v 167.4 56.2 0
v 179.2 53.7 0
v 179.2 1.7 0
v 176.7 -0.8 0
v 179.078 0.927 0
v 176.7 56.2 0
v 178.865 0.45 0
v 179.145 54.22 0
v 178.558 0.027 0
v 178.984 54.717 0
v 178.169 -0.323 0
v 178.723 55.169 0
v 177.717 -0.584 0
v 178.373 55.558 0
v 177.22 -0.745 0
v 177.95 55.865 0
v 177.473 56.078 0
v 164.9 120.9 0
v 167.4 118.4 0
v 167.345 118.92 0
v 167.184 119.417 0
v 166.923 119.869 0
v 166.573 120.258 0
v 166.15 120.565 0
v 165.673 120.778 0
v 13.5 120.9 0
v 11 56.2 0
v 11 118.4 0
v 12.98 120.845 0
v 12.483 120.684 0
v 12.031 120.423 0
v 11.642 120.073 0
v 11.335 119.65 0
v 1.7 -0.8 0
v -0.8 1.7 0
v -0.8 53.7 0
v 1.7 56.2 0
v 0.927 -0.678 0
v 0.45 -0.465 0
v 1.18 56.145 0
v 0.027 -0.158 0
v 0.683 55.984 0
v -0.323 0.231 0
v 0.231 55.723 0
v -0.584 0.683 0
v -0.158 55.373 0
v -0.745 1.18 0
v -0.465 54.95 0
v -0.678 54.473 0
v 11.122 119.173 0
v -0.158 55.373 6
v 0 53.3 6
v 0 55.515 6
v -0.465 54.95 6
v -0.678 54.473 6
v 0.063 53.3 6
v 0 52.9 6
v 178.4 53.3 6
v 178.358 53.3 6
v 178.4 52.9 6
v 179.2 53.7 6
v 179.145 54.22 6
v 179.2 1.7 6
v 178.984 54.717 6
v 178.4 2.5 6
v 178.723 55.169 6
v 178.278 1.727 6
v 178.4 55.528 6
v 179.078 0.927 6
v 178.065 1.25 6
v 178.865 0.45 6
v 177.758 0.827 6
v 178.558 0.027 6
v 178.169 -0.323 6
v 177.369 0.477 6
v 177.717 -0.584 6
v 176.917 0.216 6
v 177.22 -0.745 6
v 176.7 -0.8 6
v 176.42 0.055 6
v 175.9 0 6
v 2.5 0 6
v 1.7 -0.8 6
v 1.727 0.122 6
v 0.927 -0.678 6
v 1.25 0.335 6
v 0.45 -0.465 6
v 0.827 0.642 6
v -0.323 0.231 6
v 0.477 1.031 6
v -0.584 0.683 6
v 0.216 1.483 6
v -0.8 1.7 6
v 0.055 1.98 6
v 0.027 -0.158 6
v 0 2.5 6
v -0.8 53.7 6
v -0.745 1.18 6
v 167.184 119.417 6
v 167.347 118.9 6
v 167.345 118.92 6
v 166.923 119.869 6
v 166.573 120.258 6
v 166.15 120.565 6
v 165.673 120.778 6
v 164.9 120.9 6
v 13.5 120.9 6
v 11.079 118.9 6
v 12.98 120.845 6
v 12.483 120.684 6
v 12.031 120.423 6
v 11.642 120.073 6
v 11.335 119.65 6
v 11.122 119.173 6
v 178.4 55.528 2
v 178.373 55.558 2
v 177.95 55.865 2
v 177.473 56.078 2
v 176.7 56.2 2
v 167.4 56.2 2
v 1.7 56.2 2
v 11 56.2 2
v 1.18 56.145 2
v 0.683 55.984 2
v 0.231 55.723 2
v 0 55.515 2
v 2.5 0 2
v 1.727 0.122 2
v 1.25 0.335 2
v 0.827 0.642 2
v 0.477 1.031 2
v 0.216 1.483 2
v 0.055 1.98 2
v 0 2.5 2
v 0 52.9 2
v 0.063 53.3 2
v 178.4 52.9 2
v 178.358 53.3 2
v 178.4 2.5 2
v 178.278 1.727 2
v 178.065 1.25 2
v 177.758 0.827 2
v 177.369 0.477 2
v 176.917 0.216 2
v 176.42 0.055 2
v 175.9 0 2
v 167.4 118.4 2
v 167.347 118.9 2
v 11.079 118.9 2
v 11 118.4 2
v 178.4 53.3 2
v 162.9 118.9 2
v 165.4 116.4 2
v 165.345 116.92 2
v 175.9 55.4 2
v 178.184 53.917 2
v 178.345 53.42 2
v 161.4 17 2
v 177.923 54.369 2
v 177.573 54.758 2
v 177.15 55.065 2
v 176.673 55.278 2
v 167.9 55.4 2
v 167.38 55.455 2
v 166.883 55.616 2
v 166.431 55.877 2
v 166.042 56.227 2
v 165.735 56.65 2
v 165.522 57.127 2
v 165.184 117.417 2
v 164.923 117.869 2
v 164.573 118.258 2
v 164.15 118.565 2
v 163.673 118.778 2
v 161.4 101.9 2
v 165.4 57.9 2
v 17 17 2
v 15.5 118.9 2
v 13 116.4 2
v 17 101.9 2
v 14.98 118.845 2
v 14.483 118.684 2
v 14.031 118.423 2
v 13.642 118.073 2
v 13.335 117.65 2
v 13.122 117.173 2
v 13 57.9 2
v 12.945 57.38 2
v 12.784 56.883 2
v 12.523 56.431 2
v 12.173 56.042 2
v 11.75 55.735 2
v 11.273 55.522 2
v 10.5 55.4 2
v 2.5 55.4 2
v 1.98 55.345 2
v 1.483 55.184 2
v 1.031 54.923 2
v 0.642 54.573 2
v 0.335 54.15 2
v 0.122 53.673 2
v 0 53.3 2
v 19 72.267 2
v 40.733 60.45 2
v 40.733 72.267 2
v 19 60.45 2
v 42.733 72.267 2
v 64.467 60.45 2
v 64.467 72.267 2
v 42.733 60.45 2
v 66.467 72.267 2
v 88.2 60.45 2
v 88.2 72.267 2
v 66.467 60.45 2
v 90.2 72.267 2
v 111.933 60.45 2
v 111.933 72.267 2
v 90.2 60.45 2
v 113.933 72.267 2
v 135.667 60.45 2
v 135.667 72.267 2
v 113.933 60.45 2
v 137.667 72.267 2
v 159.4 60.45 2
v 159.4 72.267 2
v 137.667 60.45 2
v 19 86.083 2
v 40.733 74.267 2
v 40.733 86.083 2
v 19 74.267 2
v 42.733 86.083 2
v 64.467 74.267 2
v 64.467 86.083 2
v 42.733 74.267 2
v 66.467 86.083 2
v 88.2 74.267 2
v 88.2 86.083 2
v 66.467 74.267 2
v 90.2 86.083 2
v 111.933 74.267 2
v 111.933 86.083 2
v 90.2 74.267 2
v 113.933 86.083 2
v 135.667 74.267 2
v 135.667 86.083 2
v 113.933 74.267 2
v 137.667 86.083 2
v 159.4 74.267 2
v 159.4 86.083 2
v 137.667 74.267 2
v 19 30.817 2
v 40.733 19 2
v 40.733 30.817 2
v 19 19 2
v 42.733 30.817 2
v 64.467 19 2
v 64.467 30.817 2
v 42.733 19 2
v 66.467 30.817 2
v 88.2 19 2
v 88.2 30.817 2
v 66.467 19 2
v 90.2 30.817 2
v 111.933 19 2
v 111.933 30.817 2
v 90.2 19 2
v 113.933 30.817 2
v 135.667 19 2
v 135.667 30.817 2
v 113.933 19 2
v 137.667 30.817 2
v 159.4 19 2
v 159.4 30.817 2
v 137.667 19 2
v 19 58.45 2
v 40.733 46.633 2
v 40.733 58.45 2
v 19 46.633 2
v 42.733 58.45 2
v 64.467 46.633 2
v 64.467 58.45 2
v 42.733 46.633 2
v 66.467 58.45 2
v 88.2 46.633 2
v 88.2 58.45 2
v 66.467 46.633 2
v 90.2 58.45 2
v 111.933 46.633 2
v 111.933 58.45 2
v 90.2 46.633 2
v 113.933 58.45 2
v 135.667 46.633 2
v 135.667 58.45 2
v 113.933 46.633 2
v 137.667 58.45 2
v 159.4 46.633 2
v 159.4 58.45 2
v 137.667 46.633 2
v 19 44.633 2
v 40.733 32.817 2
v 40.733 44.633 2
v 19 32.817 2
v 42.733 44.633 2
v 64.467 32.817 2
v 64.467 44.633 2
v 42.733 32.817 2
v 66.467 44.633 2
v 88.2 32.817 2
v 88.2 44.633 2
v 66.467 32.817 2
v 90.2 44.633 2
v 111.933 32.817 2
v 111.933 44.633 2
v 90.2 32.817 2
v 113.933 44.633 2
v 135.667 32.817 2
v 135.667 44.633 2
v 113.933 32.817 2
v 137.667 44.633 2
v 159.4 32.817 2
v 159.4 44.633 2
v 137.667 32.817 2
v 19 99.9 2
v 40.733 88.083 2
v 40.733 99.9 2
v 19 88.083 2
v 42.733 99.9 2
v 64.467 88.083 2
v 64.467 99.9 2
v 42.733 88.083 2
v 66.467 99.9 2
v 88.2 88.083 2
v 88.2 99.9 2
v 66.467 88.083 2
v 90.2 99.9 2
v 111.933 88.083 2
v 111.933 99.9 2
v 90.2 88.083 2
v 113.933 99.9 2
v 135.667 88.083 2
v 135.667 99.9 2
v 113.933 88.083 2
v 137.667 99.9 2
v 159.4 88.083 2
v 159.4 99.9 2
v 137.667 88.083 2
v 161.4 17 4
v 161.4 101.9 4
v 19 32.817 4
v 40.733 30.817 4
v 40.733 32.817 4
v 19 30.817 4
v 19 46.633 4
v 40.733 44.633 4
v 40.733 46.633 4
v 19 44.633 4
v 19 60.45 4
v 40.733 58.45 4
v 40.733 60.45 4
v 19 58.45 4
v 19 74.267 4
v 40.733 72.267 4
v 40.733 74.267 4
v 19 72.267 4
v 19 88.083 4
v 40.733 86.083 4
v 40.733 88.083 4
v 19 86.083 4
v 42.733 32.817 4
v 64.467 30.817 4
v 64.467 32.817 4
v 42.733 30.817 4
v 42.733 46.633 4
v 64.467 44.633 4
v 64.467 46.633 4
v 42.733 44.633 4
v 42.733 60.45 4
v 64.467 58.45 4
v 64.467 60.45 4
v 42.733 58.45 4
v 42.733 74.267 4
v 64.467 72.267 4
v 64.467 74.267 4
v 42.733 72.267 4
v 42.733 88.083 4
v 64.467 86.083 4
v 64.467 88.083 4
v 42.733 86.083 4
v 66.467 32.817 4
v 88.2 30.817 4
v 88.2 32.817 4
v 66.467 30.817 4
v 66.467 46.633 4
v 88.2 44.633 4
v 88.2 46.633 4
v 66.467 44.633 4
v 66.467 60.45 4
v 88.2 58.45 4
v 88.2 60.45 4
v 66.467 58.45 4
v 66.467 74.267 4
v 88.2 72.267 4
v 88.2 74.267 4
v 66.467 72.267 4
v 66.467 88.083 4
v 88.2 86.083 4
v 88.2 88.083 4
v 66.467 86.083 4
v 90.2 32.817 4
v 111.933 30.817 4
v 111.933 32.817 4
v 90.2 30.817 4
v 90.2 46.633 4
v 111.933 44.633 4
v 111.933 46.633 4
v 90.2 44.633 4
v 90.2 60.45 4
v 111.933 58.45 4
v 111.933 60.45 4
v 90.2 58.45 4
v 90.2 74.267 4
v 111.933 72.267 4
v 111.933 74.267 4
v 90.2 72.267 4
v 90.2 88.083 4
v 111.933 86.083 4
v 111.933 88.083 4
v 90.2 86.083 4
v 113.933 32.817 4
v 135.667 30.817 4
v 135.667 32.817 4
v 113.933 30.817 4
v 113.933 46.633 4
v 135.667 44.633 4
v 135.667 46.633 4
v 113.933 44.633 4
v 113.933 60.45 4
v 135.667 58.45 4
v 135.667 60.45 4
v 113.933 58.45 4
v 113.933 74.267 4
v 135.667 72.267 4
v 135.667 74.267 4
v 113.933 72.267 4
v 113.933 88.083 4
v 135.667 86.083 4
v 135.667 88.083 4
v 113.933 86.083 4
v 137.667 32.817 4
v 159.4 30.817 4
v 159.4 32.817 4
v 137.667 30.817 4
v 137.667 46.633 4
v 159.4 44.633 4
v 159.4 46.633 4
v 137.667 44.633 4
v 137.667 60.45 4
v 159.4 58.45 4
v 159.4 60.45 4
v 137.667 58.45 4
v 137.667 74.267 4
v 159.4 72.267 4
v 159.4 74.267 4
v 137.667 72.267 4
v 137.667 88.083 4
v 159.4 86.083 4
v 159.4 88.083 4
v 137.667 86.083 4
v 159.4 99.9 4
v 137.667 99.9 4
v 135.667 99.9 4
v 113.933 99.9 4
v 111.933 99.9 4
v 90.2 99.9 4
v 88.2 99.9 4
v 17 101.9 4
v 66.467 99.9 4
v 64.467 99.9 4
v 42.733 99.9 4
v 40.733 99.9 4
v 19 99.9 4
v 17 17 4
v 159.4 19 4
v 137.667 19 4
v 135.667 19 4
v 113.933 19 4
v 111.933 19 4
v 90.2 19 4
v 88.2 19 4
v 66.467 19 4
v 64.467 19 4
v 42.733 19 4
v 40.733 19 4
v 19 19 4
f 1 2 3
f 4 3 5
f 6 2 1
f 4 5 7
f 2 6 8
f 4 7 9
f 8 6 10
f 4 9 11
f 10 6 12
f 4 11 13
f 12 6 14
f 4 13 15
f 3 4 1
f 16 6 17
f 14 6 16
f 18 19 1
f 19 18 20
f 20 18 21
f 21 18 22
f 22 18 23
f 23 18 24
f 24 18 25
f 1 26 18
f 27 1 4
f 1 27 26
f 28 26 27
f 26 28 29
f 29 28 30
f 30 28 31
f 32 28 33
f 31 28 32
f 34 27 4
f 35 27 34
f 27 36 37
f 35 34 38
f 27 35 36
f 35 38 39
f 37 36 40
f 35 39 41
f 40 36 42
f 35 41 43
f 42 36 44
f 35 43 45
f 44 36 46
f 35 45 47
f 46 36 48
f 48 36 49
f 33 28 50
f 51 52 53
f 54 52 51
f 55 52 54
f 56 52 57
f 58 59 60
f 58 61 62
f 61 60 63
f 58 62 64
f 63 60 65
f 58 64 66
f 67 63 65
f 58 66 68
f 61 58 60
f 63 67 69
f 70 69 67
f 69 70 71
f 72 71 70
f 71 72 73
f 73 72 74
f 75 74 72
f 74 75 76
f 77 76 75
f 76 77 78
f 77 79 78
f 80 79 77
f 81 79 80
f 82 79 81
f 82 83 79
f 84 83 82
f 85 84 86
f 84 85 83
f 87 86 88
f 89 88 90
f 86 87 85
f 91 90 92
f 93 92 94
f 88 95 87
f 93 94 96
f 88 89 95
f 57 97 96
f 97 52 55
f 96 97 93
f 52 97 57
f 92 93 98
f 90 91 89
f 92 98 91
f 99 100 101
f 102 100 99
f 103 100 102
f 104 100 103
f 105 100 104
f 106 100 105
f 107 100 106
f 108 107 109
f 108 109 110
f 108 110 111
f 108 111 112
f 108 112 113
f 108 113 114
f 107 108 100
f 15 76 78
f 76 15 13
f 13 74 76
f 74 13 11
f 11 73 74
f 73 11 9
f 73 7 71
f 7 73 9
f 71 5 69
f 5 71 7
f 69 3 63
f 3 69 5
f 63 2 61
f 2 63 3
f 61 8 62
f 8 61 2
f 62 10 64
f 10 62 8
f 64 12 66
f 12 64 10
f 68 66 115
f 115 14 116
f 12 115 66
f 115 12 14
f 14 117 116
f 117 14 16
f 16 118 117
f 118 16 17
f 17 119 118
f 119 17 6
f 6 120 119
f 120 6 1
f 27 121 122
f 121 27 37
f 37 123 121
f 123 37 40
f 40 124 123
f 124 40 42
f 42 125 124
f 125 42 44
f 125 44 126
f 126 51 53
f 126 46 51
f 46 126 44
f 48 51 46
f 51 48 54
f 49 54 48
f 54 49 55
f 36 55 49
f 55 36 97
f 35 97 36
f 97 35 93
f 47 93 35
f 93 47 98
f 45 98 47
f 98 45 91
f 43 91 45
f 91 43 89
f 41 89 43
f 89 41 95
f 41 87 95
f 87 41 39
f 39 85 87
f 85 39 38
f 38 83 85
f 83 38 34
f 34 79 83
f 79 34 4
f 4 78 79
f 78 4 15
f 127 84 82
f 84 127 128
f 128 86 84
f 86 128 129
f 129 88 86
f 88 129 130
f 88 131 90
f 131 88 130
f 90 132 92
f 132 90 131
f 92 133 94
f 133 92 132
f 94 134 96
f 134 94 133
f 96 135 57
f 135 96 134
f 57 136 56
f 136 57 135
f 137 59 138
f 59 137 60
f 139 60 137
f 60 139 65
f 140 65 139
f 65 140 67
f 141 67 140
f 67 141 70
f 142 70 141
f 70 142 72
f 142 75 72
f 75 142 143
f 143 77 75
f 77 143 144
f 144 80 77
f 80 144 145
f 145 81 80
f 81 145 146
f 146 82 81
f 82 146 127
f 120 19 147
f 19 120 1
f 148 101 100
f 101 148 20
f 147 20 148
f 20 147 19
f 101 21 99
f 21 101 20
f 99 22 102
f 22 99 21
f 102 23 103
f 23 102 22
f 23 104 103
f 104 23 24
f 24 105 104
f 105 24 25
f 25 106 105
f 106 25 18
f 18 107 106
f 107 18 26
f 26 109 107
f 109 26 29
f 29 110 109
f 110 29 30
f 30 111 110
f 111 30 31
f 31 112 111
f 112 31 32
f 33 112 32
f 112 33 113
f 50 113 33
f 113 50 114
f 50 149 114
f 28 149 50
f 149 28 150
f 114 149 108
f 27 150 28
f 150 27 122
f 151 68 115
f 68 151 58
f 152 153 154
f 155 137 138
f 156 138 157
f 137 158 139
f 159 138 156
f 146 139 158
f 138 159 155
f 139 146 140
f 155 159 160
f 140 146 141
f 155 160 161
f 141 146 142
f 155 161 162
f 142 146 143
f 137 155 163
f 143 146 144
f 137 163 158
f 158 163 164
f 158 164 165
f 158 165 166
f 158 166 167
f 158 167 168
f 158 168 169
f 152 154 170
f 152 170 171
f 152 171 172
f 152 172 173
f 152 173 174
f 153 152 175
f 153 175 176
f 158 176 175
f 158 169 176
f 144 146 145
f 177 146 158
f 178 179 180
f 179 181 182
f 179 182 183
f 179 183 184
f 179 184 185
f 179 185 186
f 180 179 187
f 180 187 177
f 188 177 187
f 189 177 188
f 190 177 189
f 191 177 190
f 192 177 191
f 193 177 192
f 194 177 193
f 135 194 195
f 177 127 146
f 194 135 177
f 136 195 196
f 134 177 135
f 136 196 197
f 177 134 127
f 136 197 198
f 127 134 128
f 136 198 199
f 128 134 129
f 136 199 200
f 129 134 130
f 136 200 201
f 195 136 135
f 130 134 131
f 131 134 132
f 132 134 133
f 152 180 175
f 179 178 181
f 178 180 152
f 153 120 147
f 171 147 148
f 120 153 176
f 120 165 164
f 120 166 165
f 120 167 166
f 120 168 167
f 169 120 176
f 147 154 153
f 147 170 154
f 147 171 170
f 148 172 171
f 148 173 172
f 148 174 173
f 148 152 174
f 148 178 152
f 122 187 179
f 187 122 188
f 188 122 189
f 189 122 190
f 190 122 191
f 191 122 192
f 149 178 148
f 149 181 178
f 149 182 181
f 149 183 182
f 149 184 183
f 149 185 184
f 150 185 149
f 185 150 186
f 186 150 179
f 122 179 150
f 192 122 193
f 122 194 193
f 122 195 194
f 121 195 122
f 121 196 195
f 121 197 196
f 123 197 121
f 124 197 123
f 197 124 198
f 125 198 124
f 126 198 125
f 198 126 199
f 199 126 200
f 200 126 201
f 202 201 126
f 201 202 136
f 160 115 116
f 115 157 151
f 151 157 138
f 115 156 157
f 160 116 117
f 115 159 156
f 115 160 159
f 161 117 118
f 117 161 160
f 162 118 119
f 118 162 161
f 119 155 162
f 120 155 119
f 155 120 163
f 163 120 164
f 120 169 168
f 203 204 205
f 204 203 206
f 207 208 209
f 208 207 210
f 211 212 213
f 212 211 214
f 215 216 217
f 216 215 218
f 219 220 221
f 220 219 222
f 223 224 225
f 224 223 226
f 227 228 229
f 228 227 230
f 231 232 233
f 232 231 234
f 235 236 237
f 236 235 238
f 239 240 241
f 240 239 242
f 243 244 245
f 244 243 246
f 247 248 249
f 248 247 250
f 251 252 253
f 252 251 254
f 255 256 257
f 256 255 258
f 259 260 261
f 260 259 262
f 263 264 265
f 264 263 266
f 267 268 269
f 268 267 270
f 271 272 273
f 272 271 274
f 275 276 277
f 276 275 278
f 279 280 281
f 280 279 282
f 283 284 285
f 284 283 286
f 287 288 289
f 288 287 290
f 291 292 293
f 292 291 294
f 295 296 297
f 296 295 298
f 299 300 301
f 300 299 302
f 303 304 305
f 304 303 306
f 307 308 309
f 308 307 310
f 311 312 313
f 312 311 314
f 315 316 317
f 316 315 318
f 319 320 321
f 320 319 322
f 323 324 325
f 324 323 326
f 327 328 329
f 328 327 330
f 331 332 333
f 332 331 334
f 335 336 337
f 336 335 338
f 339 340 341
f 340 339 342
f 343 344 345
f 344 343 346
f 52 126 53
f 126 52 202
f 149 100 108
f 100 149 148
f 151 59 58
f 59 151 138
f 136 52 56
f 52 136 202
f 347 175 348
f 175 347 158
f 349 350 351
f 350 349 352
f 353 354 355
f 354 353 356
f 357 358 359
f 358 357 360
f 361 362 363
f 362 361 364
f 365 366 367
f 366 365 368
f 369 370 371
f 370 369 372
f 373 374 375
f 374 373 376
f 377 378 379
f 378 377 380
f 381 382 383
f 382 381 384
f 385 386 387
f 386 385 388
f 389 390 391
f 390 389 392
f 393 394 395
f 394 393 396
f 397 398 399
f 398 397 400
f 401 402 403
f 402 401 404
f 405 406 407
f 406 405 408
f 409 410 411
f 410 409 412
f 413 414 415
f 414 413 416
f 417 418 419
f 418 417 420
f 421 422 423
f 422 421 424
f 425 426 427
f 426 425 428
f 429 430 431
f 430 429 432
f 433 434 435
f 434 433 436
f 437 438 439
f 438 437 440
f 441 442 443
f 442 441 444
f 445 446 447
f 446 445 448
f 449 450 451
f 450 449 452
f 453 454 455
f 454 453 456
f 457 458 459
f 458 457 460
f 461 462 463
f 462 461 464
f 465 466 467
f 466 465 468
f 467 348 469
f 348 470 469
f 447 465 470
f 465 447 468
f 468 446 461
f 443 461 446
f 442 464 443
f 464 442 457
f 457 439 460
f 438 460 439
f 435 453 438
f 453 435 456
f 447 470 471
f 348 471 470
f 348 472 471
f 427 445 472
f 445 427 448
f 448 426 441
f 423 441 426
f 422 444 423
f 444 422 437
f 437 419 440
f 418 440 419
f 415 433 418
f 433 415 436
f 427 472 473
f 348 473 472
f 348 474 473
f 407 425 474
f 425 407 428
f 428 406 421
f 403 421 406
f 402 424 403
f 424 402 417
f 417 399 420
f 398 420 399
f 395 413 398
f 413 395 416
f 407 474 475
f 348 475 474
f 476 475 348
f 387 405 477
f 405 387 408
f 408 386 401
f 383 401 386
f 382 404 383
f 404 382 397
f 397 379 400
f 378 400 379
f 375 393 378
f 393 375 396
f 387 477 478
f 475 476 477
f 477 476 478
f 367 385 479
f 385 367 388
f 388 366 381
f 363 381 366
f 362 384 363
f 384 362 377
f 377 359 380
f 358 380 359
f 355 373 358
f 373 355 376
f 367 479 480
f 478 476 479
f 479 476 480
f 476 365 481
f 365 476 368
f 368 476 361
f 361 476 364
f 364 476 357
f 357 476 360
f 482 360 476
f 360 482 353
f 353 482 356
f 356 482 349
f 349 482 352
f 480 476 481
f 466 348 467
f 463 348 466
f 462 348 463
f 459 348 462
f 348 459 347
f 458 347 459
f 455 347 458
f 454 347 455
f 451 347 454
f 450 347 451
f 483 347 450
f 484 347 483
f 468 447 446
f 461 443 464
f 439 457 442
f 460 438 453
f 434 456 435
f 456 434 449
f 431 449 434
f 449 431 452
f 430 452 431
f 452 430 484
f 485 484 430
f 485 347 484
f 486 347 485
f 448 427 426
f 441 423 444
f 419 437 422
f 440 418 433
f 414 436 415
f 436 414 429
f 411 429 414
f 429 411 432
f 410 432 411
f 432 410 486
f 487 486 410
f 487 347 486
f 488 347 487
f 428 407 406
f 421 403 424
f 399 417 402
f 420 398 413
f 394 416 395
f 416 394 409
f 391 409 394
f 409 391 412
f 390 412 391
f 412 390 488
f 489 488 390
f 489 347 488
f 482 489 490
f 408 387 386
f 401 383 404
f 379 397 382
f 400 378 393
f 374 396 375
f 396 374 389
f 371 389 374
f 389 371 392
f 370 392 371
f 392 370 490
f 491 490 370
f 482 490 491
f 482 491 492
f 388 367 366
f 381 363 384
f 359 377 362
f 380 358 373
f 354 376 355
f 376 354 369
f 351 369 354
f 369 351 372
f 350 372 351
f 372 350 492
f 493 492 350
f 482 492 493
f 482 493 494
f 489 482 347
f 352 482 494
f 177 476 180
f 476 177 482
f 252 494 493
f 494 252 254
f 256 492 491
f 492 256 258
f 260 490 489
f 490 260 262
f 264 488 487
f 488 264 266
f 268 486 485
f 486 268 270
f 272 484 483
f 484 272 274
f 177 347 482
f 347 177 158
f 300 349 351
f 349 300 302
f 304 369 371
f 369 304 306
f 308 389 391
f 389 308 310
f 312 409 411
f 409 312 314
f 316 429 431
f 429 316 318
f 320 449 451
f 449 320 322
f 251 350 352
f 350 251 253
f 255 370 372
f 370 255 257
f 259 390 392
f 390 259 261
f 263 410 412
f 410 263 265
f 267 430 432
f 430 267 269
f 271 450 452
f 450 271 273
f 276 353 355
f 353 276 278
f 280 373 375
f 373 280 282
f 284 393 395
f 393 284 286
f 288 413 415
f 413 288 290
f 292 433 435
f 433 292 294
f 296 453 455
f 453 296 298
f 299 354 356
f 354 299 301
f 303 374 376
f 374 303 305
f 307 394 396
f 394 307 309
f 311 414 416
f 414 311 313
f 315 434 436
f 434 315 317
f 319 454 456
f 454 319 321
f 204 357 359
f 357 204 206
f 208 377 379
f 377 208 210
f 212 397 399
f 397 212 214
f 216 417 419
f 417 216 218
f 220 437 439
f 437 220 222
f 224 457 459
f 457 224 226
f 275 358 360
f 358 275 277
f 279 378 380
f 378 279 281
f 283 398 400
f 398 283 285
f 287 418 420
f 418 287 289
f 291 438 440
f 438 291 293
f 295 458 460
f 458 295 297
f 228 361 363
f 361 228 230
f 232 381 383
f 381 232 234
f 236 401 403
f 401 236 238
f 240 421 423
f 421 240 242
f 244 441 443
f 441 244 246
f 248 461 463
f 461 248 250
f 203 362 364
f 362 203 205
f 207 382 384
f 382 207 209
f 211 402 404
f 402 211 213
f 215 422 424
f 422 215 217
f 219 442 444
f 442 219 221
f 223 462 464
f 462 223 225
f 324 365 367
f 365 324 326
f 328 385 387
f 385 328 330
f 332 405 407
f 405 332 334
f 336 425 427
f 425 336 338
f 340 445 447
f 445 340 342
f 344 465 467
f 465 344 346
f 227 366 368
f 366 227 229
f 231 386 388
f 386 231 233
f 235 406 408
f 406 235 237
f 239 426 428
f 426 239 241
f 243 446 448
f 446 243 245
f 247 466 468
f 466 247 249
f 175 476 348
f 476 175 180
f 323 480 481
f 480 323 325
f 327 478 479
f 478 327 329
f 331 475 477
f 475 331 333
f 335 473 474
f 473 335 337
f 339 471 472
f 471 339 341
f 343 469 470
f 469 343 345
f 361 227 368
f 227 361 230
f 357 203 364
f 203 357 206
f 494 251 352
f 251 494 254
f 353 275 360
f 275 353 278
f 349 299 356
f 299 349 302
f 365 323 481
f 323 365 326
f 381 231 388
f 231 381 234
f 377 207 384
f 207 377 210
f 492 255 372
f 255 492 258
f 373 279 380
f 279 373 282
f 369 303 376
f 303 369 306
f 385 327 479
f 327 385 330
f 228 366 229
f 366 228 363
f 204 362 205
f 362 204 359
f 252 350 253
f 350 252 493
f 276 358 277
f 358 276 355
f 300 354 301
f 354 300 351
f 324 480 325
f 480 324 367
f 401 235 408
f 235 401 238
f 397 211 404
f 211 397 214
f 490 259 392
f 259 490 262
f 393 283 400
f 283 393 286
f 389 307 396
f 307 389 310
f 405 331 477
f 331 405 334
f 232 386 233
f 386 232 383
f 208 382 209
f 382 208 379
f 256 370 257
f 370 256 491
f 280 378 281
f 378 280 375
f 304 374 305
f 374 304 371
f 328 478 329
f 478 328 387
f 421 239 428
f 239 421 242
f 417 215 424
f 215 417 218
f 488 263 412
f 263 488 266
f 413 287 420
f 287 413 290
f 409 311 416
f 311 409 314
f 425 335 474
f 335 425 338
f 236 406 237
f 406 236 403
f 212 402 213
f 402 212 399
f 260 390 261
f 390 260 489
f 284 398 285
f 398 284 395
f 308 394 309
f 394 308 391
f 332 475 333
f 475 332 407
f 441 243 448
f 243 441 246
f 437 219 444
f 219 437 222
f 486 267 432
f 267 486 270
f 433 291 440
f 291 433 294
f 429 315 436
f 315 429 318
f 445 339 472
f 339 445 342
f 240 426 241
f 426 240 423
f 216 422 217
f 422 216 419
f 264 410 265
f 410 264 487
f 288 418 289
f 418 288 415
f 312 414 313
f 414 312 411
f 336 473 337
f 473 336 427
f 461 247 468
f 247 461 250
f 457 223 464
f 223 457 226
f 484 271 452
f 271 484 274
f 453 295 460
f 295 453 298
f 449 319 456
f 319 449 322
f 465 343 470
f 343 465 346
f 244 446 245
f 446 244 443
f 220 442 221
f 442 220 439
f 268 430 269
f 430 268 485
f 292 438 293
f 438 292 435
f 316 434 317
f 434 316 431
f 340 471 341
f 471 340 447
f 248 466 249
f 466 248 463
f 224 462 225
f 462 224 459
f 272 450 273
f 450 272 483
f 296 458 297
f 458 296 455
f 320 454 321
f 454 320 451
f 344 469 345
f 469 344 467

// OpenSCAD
// ////////////////////////////////////////////////////////////
//
// D7 Vat cover
//
// Copyright 2017 Kevin F. Quinn
//
// This work is licensed under the Creative Commons
// Attribution-ShareAlike 4.0 International License. To view a
// copy of the license, visit
// https://creativecommons.org/licenses/by-sa/4.0/
//
// History
// 2017-11-08 1.0 Initial publication
// 2018-02-11 1.1 Customizer tweaks; works with OpenSCAD built-in customizer

/*
 Vat dimensions:
  Outer - 178 x 118.5
  Inner - 147.5 x 90.0
  Thickness - 15mm, 14.5mm
  Depth - 30mm
  Screws are 6mm, holes are 7mm, in the middle (56mm from outside edge)
 
 Shape is:
 
    ________
   | 156    |
   |        | 62.5
  _|        |_
 |11        11|
 |            | 56
 |____________|
     178

 In profile; has an overhang all around the front, and at the back.
 No overhang on the cutout areas of course.
*/


/* [What to print] */
// Choose the part to print, base or cover. Base rim is for a rapid print to check dimensions
part = "cover"; // [cover:Cover,base:Base,rim:Base rim]

/* [Dimensions] */
// Size of the vat in the X axis - D7 standard vat is 178mm
x_size=178; // [170:0.1:200]
// Size of the vat in the Y axis - D7 standard vat is 56mm
y_size=56; // [50:0.1:60]
// Depth of the main base panel (excluding raised parts) - note this is the main consumer of plastic!
base_height=2; // [0.4:0.2:3.2]
// Depth of the lip around the edge of the cover
lip_height=4; // [0:1:6]
// Width of border overhanging the vat. 0.8 to be narrow enough to avoid fouling on the D7 cover seal (well, if you're careful)
border=0.8; // [0.4:0.2:3.2]

// Clearance - piece is oversized by this amount around the edges of the vat
clearance=0.2; // [0:0.1:0.8]

/* [Hidden] */
module break() {}

$fn=30;

front_x=x_size+clearance*2;
front_y=y_size+clearance;
cutout_x=11;
back_x=front_x-2*cutout_x;
back_y=62.5+clearance;
vat_th=15;
height=base_height;
lip=lip_height;
beam=2;
corner=2.5;
gs=0.1;


module cover_front() {
  square([front_x,front_y-border]);
}
module cover_back(pdelta=0) {
    // Top section is [border] shorter on each side; the edge lip code
    // in cover() adds the base part of the border back on. Bit ugly, but
    // this ensures the lip on the far edge has its curves at the ends.
    // Note; rear lip is 'beam' wide rather than 'border'; there's space
    // for it (unlike at the front corners of the vat which would be too
    // close to the printer cover
  translate([cutout_x+beam,front_y-border,0])
    square([back_x-beam*2,back_y+border]);
}

module cover_shape() {
  union() {
    cover_front();
    cover_back();
  }
}

module base_shape(pdelta=0) {
  square([front_x-pdelta*2,front_y+back_y-pdelta*2]);
}

module curved_shape(cdelta=0) {
  offset(r=corner) offset(delta=-corner) offset(r=-corner) offset(delta=corner+cdelta)
  children();
}


module curved_border(cborder=border) {
  difference() {
    curved_shape(cdelta=cborder) children();
    curved_shape() children();
  }
}

module box_shape(bdelta=0) {
  translate([bdelta,bdelta,0])
  difference() {
    square([front_x-bdelta*2,front_y+back_y-bdelta*2]);
    translate([border,border,0]) square([front_x-border*2-bdelta*2,front_y+back_y-border*2-bdelta*2]);
  }
}

module curved_box(cdelta=0) {
  difference() {
    curved_shape(cdelta=cdelta) children();
    curved_shape(cdelta=cdelta-border) children();
  }
}

module cover() {
  // Main panel 
  linear_extrude(height=height) curved_shape() cover_shape();
  // Outside edge and lip
  difference() {
    union() {
      linear_extrude(height=height+lip) curved_border(cborder=border) cover_front();
      linear_extrude(height=height+lip) curved_border(cborder=beam) cover_back();
    }
    translate([0,front_y-border-beam-gs,height]) cube([front_x,back_y+border+beam+gs,lip+gs]);
  }
  // internal strengthening grid
  for (off=[vat_th+beam:(front_y+back_y-vat_th*2-beam*3)/6:front_y+back_y-vat_th-beam])
    translate([vat_th+beam,off,height]) cube([front_x-(vat_th+beam)*2,beam,beam]);
  for (off=[vat_th+beam:(front_x-vat_th*2-beam*3)/6:front_x-vat_th-beam])
    translate([off,vat_th+beam,height]) cube([beam,front_y+back_y-(vat_th+beam)*2,beam]);
}

module base() {
  // Main panel 
  linear_extrude(height=height) curved_shape() base_shape();
  // Outside edge and lip
  linear_extrude(height=height+lip) curved_border(cborder=border) base_shape();
}

module punch() {
  translate([vat_th,vat_th,-gs]) cube([front_x-vat_th*2,(front_y+back_y)-vat_th*2,height*2+2*gs]);
}

if (part=="cover") {
  cover();
} else if (part=="base") {
  base();
} else if (part=="rim") {
  difference() {
    base();
    punch();
  }
}
